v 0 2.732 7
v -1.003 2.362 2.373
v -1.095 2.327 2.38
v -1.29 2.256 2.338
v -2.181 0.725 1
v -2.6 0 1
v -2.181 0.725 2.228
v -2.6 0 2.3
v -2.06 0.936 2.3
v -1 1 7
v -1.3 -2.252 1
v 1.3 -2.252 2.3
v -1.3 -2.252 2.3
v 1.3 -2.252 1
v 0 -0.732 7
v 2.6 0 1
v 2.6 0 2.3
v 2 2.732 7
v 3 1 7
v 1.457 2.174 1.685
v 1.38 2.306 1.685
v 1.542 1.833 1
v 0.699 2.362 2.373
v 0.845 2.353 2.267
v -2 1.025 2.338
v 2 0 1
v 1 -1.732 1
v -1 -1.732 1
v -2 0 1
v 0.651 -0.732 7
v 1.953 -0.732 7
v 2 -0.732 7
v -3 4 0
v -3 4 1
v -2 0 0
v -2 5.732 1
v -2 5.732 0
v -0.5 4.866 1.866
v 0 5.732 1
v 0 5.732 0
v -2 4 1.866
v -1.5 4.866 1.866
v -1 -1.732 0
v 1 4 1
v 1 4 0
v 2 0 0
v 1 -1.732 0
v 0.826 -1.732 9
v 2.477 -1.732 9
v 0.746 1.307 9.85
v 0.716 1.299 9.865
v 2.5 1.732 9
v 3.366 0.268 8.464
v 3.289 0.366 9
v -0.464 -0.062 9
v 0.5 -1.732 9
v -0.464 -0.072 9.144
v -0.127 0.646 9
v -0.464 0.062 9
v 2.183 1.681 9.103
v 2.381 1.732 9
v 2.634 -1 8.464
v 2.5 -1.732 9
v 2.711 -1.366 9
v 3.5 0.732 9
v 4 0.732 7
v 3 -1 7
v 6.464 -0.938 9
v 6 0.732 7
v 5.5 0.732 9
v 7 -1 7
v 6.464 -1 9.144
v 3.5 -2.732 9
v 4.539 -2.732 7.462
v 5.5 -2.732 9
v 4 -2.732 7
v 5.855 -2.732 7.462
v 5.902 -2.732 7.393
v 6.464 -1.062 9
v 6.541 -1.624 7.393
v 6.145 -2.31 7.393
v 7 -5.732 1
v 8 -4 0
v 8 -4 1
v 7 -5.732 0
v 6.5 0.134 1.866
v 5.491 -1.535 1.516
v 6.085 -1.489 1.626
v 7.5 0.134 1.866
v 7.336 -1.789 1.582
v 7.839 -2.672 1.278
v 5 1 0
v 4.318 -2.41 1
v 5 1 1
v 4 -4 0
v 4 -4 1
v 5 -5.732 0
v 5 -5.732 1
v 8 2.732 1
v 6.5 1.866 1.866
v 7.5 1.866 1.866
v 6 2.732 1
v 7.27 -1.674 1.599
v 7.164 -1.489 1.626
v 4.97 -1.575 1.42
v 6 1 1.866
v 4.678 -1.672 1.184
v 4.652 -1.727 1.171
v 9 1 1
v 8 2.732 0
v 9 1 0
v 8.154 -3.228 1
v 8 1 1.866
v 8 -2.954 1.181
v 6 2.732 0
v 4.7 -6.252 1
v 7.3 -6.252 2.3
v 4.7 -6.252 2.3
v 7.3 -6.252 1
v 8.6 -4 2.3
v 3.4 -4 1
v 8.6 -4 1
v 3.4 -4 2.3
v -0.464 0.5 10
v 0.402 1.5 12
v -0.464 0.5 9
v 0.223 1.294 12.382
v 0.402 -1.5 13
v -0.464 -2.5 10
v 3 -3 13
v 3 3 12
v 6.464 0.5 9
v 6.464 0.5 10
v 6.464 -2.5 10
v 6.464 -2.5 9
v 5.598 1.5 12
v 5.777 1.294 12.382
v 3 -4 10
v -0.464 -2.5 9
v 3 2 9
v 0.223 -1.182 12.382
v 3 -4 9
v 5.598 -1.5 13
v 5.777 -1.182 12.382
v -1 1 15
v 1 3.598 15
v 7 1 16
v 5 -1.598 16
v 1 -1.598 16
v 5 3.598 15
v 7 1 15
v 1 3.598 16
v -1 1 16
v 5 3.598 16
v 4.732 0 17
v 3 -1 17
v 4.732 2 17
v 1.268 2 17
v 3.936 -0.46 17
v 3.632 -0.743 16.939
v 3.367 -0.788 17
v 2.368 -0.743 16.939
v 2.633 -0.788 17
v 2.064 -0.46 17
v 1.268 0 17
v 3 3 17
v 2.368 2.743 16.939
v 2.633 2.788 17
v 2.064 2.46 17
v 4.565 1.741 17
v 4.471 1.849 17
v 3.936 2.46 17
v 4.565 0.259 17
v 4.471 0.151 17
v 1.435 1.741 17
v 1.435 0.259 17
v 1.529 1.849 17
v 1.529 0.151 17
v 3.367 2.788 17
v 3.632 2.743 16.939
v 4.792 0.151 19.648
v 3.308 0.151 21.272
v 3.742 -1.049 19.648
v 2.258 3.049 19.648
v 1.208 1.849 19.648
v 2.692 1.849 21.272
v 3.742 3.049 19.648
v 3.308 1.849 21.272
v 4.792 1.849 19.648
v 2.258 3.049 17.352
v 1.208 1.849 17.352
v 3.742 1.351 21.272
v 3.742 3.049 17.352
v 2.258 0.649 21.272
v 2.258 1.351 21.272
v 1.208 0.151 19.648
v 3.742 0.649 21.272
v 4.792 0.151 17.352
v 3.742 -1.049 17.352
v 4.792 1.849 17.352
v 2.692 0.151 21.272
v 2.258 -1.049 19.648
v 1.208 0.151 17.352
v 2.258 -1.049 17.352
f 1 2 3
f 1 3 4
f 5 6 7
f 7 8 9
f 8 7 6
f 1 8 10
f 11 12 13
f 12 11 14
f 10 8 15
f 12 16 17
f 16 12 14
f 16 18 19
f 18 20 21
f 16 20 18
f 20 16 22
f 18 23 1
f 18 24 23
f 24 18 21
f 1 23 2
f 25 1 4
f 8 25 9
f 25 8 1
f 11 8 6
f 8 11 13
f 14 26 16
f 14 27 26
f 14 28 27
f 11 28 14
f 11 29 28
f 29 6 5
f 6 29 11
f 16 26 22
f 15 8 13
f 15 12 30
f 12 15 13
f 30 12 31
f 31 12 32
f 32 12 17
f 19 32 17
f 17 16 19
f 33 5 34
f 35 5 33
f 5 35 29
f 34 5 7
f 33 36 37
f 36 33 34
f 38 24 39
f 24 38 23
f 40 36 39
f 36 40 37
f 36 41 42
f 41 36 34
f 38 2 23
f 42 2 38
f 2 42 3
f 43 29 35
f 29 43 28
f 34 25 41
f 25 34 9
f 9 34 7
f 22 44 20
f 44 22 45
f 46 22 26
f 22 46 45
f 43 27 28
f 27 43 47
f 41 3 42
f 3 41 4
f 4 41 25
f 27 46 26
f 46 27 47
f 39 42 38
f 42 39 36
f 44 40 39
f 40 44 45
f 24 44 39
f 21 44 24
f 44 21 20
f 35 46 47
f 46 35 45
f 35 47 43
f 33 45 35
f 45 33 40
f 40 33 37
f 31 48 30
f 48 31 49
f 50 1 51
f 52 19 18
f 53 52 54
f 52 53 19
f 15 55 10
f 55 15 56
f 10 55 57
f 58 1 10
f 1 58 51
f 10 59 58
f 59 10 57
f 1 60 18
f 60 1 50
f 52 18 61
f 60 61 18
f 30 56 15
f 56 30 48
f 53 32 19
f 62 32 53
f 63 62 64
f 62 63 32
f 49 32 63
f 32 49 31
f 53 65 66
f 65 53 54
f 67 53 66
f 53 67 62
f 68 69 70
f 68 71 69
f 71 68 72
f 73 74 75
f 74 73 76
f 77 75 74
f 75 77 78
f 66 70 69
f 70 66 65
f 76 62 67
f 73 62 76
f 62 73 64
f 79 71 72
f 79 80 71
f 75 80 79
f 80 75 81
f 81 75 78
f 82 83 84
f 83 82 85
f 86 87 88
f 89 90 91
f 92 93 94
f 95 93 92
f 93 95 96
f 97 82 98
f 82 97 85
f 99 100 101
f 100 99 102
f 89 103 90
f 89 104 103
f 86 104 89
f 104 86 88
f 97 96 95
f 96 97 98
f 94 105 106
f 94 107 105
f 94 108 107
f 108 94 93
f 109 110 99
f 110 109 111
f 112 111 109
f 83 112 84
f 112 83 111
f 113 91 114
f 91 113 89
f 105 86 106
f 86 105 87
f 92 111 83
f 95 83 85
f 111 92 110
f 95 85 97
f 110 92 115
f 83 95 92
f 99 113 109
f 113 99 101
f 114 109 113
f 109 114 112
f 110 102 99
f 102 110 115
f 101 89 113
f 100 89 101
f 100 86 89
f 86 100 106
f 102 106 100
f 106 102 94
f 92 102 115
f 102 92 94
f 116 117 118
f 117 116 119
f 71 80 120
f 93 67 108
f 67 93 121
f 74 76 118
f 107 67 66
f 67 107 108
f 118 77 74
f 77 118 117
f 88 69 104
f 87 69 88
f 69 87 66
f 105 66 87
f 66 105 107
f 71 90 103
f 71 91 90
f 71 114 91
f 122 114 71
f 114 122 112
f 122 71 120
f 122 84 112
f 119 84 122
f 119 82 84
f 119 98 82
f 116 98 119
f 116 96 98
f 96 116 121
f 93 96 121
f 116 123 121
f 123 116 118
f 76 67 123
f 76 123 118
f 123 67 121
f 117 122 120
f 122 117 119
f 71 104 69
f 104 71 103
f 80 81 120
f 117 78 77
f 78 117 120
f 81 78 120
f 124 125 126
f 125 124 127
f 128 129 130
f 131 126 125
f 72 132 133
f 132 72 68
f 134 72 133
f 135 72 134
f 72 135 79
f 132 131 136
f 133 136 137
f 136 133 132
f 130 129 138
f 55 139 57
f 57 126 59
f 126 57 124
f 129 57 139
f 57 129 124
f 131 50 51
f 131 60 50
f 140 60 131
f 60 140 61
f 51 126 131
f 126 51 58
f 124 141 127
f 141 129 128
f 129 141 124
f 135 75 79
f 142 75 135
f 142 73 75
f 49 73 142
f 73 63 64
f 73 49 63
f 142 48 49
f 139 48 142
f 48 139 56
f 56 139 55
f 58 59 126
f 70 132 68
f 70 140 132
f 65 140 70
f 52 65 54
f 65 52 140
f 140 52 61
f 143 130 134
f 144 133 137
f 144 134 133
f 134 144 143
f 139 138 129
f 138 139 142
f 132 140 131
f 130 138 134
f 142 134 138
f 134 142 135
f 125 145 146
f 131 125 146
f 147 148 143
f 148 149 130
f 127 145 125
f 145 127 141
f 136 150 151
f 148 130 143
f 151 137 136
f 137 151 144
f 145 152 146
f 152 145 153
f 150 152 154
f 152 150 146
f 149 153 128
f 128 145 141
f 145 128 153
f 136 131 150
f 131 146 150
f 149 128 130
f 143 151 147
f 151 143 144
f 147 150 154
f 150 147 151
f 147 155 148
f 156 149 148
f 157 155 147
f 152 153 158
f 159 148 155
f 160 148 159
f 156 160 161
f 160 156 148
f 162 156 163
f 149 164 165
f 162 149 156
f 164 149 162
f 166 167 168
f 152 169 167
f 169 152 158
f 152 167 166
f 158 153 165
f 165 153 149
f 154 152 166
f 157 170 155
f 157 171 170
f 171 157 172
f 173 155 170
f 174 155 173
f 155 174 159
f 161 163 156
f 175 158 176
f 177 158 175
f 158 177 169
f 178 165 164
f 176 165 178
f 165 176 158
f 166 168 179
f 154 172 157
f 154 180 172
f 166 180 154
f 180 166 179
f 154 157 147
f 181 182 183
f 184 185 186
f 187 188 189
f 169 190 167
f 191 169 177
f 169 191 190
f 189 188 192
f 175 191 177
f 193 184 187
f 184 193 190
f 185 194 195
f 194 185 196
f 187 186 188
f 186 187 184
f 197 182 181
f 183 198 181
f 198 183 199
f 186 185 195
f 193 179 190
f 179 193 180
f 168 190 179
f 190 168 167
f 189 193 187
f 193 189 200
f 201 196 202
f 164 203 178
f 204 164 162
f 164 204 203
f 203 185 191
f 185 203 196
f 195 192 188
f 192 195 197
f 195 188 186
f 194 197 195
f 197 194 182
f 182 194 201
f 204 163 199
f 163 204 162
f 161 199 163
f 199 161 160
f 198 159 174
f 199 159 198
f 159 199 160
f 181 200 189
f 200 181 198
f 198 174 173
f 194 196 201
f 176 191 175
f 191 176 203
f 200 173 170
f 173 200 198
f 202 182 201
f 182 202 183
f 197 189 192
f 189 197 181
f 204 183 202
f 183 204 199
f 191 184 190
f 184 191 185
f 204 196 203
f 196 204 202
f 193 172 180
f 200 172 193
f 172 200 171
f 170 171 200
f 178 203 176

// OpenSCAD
$fn=6;
hull(){translate([1,1,7])sphere(2);
translate([0,0,1])scale(1.3)cylinder(1,2,2);}

hull(){translate([-1,4,1])scale([1,1,0.5])sphere(2);
translate([-1,4,0])cylinder(1,2,2);
translate([0,0,0])cylinder(2.5,2,2);}
hull(){
translate([1,1,7])sphere(2);

translate([2,-1,11])sphere(2);}
hull(){
translate([5,-1,7])sphere(2);

translate([4,-1,11])sphere(2);}

translate([6,-4,0])hull(){translate([1,5,1])scale([1,1,0.5])sphere(2);
translate([1,5,0])cylinder(1,2,2);
translate([0,0,0])cylinder(1,2,2);}

hull(){
translate([5,-1,7])sphere(2);
translate([6,-4,1])scale(1.3)cylinder(1,2,2);}

hull(){

translate([3,-1,9])scale([4,3,1])rotate(90)cylinder(1,1,1);
translate([3,0,12])scale([3,3,1])rotate(90)cylinder(1,1,1);

}
hull(){
translate([3,0,9])scale([1,1,1]) cylinder(1,1,1);

translate([3,0,12])scale([3,3,1])rotate(90)cylinder(1,1,1);
translate([3,1,15])scale([4,3,1])rotate(60)cylinder(1,1,1);
}
hull(){
translate([3,1,15])scale([4,3,1])rotate(60)cylinder(1,1,1);

translate([3,1,16])scale([2,2,1])rotate(90)cylinder(1,1,1);
}
translate([3,1,18.5])scale([0.7,0.8,1])rotate(45/2)sphere(3,$fn=8);
